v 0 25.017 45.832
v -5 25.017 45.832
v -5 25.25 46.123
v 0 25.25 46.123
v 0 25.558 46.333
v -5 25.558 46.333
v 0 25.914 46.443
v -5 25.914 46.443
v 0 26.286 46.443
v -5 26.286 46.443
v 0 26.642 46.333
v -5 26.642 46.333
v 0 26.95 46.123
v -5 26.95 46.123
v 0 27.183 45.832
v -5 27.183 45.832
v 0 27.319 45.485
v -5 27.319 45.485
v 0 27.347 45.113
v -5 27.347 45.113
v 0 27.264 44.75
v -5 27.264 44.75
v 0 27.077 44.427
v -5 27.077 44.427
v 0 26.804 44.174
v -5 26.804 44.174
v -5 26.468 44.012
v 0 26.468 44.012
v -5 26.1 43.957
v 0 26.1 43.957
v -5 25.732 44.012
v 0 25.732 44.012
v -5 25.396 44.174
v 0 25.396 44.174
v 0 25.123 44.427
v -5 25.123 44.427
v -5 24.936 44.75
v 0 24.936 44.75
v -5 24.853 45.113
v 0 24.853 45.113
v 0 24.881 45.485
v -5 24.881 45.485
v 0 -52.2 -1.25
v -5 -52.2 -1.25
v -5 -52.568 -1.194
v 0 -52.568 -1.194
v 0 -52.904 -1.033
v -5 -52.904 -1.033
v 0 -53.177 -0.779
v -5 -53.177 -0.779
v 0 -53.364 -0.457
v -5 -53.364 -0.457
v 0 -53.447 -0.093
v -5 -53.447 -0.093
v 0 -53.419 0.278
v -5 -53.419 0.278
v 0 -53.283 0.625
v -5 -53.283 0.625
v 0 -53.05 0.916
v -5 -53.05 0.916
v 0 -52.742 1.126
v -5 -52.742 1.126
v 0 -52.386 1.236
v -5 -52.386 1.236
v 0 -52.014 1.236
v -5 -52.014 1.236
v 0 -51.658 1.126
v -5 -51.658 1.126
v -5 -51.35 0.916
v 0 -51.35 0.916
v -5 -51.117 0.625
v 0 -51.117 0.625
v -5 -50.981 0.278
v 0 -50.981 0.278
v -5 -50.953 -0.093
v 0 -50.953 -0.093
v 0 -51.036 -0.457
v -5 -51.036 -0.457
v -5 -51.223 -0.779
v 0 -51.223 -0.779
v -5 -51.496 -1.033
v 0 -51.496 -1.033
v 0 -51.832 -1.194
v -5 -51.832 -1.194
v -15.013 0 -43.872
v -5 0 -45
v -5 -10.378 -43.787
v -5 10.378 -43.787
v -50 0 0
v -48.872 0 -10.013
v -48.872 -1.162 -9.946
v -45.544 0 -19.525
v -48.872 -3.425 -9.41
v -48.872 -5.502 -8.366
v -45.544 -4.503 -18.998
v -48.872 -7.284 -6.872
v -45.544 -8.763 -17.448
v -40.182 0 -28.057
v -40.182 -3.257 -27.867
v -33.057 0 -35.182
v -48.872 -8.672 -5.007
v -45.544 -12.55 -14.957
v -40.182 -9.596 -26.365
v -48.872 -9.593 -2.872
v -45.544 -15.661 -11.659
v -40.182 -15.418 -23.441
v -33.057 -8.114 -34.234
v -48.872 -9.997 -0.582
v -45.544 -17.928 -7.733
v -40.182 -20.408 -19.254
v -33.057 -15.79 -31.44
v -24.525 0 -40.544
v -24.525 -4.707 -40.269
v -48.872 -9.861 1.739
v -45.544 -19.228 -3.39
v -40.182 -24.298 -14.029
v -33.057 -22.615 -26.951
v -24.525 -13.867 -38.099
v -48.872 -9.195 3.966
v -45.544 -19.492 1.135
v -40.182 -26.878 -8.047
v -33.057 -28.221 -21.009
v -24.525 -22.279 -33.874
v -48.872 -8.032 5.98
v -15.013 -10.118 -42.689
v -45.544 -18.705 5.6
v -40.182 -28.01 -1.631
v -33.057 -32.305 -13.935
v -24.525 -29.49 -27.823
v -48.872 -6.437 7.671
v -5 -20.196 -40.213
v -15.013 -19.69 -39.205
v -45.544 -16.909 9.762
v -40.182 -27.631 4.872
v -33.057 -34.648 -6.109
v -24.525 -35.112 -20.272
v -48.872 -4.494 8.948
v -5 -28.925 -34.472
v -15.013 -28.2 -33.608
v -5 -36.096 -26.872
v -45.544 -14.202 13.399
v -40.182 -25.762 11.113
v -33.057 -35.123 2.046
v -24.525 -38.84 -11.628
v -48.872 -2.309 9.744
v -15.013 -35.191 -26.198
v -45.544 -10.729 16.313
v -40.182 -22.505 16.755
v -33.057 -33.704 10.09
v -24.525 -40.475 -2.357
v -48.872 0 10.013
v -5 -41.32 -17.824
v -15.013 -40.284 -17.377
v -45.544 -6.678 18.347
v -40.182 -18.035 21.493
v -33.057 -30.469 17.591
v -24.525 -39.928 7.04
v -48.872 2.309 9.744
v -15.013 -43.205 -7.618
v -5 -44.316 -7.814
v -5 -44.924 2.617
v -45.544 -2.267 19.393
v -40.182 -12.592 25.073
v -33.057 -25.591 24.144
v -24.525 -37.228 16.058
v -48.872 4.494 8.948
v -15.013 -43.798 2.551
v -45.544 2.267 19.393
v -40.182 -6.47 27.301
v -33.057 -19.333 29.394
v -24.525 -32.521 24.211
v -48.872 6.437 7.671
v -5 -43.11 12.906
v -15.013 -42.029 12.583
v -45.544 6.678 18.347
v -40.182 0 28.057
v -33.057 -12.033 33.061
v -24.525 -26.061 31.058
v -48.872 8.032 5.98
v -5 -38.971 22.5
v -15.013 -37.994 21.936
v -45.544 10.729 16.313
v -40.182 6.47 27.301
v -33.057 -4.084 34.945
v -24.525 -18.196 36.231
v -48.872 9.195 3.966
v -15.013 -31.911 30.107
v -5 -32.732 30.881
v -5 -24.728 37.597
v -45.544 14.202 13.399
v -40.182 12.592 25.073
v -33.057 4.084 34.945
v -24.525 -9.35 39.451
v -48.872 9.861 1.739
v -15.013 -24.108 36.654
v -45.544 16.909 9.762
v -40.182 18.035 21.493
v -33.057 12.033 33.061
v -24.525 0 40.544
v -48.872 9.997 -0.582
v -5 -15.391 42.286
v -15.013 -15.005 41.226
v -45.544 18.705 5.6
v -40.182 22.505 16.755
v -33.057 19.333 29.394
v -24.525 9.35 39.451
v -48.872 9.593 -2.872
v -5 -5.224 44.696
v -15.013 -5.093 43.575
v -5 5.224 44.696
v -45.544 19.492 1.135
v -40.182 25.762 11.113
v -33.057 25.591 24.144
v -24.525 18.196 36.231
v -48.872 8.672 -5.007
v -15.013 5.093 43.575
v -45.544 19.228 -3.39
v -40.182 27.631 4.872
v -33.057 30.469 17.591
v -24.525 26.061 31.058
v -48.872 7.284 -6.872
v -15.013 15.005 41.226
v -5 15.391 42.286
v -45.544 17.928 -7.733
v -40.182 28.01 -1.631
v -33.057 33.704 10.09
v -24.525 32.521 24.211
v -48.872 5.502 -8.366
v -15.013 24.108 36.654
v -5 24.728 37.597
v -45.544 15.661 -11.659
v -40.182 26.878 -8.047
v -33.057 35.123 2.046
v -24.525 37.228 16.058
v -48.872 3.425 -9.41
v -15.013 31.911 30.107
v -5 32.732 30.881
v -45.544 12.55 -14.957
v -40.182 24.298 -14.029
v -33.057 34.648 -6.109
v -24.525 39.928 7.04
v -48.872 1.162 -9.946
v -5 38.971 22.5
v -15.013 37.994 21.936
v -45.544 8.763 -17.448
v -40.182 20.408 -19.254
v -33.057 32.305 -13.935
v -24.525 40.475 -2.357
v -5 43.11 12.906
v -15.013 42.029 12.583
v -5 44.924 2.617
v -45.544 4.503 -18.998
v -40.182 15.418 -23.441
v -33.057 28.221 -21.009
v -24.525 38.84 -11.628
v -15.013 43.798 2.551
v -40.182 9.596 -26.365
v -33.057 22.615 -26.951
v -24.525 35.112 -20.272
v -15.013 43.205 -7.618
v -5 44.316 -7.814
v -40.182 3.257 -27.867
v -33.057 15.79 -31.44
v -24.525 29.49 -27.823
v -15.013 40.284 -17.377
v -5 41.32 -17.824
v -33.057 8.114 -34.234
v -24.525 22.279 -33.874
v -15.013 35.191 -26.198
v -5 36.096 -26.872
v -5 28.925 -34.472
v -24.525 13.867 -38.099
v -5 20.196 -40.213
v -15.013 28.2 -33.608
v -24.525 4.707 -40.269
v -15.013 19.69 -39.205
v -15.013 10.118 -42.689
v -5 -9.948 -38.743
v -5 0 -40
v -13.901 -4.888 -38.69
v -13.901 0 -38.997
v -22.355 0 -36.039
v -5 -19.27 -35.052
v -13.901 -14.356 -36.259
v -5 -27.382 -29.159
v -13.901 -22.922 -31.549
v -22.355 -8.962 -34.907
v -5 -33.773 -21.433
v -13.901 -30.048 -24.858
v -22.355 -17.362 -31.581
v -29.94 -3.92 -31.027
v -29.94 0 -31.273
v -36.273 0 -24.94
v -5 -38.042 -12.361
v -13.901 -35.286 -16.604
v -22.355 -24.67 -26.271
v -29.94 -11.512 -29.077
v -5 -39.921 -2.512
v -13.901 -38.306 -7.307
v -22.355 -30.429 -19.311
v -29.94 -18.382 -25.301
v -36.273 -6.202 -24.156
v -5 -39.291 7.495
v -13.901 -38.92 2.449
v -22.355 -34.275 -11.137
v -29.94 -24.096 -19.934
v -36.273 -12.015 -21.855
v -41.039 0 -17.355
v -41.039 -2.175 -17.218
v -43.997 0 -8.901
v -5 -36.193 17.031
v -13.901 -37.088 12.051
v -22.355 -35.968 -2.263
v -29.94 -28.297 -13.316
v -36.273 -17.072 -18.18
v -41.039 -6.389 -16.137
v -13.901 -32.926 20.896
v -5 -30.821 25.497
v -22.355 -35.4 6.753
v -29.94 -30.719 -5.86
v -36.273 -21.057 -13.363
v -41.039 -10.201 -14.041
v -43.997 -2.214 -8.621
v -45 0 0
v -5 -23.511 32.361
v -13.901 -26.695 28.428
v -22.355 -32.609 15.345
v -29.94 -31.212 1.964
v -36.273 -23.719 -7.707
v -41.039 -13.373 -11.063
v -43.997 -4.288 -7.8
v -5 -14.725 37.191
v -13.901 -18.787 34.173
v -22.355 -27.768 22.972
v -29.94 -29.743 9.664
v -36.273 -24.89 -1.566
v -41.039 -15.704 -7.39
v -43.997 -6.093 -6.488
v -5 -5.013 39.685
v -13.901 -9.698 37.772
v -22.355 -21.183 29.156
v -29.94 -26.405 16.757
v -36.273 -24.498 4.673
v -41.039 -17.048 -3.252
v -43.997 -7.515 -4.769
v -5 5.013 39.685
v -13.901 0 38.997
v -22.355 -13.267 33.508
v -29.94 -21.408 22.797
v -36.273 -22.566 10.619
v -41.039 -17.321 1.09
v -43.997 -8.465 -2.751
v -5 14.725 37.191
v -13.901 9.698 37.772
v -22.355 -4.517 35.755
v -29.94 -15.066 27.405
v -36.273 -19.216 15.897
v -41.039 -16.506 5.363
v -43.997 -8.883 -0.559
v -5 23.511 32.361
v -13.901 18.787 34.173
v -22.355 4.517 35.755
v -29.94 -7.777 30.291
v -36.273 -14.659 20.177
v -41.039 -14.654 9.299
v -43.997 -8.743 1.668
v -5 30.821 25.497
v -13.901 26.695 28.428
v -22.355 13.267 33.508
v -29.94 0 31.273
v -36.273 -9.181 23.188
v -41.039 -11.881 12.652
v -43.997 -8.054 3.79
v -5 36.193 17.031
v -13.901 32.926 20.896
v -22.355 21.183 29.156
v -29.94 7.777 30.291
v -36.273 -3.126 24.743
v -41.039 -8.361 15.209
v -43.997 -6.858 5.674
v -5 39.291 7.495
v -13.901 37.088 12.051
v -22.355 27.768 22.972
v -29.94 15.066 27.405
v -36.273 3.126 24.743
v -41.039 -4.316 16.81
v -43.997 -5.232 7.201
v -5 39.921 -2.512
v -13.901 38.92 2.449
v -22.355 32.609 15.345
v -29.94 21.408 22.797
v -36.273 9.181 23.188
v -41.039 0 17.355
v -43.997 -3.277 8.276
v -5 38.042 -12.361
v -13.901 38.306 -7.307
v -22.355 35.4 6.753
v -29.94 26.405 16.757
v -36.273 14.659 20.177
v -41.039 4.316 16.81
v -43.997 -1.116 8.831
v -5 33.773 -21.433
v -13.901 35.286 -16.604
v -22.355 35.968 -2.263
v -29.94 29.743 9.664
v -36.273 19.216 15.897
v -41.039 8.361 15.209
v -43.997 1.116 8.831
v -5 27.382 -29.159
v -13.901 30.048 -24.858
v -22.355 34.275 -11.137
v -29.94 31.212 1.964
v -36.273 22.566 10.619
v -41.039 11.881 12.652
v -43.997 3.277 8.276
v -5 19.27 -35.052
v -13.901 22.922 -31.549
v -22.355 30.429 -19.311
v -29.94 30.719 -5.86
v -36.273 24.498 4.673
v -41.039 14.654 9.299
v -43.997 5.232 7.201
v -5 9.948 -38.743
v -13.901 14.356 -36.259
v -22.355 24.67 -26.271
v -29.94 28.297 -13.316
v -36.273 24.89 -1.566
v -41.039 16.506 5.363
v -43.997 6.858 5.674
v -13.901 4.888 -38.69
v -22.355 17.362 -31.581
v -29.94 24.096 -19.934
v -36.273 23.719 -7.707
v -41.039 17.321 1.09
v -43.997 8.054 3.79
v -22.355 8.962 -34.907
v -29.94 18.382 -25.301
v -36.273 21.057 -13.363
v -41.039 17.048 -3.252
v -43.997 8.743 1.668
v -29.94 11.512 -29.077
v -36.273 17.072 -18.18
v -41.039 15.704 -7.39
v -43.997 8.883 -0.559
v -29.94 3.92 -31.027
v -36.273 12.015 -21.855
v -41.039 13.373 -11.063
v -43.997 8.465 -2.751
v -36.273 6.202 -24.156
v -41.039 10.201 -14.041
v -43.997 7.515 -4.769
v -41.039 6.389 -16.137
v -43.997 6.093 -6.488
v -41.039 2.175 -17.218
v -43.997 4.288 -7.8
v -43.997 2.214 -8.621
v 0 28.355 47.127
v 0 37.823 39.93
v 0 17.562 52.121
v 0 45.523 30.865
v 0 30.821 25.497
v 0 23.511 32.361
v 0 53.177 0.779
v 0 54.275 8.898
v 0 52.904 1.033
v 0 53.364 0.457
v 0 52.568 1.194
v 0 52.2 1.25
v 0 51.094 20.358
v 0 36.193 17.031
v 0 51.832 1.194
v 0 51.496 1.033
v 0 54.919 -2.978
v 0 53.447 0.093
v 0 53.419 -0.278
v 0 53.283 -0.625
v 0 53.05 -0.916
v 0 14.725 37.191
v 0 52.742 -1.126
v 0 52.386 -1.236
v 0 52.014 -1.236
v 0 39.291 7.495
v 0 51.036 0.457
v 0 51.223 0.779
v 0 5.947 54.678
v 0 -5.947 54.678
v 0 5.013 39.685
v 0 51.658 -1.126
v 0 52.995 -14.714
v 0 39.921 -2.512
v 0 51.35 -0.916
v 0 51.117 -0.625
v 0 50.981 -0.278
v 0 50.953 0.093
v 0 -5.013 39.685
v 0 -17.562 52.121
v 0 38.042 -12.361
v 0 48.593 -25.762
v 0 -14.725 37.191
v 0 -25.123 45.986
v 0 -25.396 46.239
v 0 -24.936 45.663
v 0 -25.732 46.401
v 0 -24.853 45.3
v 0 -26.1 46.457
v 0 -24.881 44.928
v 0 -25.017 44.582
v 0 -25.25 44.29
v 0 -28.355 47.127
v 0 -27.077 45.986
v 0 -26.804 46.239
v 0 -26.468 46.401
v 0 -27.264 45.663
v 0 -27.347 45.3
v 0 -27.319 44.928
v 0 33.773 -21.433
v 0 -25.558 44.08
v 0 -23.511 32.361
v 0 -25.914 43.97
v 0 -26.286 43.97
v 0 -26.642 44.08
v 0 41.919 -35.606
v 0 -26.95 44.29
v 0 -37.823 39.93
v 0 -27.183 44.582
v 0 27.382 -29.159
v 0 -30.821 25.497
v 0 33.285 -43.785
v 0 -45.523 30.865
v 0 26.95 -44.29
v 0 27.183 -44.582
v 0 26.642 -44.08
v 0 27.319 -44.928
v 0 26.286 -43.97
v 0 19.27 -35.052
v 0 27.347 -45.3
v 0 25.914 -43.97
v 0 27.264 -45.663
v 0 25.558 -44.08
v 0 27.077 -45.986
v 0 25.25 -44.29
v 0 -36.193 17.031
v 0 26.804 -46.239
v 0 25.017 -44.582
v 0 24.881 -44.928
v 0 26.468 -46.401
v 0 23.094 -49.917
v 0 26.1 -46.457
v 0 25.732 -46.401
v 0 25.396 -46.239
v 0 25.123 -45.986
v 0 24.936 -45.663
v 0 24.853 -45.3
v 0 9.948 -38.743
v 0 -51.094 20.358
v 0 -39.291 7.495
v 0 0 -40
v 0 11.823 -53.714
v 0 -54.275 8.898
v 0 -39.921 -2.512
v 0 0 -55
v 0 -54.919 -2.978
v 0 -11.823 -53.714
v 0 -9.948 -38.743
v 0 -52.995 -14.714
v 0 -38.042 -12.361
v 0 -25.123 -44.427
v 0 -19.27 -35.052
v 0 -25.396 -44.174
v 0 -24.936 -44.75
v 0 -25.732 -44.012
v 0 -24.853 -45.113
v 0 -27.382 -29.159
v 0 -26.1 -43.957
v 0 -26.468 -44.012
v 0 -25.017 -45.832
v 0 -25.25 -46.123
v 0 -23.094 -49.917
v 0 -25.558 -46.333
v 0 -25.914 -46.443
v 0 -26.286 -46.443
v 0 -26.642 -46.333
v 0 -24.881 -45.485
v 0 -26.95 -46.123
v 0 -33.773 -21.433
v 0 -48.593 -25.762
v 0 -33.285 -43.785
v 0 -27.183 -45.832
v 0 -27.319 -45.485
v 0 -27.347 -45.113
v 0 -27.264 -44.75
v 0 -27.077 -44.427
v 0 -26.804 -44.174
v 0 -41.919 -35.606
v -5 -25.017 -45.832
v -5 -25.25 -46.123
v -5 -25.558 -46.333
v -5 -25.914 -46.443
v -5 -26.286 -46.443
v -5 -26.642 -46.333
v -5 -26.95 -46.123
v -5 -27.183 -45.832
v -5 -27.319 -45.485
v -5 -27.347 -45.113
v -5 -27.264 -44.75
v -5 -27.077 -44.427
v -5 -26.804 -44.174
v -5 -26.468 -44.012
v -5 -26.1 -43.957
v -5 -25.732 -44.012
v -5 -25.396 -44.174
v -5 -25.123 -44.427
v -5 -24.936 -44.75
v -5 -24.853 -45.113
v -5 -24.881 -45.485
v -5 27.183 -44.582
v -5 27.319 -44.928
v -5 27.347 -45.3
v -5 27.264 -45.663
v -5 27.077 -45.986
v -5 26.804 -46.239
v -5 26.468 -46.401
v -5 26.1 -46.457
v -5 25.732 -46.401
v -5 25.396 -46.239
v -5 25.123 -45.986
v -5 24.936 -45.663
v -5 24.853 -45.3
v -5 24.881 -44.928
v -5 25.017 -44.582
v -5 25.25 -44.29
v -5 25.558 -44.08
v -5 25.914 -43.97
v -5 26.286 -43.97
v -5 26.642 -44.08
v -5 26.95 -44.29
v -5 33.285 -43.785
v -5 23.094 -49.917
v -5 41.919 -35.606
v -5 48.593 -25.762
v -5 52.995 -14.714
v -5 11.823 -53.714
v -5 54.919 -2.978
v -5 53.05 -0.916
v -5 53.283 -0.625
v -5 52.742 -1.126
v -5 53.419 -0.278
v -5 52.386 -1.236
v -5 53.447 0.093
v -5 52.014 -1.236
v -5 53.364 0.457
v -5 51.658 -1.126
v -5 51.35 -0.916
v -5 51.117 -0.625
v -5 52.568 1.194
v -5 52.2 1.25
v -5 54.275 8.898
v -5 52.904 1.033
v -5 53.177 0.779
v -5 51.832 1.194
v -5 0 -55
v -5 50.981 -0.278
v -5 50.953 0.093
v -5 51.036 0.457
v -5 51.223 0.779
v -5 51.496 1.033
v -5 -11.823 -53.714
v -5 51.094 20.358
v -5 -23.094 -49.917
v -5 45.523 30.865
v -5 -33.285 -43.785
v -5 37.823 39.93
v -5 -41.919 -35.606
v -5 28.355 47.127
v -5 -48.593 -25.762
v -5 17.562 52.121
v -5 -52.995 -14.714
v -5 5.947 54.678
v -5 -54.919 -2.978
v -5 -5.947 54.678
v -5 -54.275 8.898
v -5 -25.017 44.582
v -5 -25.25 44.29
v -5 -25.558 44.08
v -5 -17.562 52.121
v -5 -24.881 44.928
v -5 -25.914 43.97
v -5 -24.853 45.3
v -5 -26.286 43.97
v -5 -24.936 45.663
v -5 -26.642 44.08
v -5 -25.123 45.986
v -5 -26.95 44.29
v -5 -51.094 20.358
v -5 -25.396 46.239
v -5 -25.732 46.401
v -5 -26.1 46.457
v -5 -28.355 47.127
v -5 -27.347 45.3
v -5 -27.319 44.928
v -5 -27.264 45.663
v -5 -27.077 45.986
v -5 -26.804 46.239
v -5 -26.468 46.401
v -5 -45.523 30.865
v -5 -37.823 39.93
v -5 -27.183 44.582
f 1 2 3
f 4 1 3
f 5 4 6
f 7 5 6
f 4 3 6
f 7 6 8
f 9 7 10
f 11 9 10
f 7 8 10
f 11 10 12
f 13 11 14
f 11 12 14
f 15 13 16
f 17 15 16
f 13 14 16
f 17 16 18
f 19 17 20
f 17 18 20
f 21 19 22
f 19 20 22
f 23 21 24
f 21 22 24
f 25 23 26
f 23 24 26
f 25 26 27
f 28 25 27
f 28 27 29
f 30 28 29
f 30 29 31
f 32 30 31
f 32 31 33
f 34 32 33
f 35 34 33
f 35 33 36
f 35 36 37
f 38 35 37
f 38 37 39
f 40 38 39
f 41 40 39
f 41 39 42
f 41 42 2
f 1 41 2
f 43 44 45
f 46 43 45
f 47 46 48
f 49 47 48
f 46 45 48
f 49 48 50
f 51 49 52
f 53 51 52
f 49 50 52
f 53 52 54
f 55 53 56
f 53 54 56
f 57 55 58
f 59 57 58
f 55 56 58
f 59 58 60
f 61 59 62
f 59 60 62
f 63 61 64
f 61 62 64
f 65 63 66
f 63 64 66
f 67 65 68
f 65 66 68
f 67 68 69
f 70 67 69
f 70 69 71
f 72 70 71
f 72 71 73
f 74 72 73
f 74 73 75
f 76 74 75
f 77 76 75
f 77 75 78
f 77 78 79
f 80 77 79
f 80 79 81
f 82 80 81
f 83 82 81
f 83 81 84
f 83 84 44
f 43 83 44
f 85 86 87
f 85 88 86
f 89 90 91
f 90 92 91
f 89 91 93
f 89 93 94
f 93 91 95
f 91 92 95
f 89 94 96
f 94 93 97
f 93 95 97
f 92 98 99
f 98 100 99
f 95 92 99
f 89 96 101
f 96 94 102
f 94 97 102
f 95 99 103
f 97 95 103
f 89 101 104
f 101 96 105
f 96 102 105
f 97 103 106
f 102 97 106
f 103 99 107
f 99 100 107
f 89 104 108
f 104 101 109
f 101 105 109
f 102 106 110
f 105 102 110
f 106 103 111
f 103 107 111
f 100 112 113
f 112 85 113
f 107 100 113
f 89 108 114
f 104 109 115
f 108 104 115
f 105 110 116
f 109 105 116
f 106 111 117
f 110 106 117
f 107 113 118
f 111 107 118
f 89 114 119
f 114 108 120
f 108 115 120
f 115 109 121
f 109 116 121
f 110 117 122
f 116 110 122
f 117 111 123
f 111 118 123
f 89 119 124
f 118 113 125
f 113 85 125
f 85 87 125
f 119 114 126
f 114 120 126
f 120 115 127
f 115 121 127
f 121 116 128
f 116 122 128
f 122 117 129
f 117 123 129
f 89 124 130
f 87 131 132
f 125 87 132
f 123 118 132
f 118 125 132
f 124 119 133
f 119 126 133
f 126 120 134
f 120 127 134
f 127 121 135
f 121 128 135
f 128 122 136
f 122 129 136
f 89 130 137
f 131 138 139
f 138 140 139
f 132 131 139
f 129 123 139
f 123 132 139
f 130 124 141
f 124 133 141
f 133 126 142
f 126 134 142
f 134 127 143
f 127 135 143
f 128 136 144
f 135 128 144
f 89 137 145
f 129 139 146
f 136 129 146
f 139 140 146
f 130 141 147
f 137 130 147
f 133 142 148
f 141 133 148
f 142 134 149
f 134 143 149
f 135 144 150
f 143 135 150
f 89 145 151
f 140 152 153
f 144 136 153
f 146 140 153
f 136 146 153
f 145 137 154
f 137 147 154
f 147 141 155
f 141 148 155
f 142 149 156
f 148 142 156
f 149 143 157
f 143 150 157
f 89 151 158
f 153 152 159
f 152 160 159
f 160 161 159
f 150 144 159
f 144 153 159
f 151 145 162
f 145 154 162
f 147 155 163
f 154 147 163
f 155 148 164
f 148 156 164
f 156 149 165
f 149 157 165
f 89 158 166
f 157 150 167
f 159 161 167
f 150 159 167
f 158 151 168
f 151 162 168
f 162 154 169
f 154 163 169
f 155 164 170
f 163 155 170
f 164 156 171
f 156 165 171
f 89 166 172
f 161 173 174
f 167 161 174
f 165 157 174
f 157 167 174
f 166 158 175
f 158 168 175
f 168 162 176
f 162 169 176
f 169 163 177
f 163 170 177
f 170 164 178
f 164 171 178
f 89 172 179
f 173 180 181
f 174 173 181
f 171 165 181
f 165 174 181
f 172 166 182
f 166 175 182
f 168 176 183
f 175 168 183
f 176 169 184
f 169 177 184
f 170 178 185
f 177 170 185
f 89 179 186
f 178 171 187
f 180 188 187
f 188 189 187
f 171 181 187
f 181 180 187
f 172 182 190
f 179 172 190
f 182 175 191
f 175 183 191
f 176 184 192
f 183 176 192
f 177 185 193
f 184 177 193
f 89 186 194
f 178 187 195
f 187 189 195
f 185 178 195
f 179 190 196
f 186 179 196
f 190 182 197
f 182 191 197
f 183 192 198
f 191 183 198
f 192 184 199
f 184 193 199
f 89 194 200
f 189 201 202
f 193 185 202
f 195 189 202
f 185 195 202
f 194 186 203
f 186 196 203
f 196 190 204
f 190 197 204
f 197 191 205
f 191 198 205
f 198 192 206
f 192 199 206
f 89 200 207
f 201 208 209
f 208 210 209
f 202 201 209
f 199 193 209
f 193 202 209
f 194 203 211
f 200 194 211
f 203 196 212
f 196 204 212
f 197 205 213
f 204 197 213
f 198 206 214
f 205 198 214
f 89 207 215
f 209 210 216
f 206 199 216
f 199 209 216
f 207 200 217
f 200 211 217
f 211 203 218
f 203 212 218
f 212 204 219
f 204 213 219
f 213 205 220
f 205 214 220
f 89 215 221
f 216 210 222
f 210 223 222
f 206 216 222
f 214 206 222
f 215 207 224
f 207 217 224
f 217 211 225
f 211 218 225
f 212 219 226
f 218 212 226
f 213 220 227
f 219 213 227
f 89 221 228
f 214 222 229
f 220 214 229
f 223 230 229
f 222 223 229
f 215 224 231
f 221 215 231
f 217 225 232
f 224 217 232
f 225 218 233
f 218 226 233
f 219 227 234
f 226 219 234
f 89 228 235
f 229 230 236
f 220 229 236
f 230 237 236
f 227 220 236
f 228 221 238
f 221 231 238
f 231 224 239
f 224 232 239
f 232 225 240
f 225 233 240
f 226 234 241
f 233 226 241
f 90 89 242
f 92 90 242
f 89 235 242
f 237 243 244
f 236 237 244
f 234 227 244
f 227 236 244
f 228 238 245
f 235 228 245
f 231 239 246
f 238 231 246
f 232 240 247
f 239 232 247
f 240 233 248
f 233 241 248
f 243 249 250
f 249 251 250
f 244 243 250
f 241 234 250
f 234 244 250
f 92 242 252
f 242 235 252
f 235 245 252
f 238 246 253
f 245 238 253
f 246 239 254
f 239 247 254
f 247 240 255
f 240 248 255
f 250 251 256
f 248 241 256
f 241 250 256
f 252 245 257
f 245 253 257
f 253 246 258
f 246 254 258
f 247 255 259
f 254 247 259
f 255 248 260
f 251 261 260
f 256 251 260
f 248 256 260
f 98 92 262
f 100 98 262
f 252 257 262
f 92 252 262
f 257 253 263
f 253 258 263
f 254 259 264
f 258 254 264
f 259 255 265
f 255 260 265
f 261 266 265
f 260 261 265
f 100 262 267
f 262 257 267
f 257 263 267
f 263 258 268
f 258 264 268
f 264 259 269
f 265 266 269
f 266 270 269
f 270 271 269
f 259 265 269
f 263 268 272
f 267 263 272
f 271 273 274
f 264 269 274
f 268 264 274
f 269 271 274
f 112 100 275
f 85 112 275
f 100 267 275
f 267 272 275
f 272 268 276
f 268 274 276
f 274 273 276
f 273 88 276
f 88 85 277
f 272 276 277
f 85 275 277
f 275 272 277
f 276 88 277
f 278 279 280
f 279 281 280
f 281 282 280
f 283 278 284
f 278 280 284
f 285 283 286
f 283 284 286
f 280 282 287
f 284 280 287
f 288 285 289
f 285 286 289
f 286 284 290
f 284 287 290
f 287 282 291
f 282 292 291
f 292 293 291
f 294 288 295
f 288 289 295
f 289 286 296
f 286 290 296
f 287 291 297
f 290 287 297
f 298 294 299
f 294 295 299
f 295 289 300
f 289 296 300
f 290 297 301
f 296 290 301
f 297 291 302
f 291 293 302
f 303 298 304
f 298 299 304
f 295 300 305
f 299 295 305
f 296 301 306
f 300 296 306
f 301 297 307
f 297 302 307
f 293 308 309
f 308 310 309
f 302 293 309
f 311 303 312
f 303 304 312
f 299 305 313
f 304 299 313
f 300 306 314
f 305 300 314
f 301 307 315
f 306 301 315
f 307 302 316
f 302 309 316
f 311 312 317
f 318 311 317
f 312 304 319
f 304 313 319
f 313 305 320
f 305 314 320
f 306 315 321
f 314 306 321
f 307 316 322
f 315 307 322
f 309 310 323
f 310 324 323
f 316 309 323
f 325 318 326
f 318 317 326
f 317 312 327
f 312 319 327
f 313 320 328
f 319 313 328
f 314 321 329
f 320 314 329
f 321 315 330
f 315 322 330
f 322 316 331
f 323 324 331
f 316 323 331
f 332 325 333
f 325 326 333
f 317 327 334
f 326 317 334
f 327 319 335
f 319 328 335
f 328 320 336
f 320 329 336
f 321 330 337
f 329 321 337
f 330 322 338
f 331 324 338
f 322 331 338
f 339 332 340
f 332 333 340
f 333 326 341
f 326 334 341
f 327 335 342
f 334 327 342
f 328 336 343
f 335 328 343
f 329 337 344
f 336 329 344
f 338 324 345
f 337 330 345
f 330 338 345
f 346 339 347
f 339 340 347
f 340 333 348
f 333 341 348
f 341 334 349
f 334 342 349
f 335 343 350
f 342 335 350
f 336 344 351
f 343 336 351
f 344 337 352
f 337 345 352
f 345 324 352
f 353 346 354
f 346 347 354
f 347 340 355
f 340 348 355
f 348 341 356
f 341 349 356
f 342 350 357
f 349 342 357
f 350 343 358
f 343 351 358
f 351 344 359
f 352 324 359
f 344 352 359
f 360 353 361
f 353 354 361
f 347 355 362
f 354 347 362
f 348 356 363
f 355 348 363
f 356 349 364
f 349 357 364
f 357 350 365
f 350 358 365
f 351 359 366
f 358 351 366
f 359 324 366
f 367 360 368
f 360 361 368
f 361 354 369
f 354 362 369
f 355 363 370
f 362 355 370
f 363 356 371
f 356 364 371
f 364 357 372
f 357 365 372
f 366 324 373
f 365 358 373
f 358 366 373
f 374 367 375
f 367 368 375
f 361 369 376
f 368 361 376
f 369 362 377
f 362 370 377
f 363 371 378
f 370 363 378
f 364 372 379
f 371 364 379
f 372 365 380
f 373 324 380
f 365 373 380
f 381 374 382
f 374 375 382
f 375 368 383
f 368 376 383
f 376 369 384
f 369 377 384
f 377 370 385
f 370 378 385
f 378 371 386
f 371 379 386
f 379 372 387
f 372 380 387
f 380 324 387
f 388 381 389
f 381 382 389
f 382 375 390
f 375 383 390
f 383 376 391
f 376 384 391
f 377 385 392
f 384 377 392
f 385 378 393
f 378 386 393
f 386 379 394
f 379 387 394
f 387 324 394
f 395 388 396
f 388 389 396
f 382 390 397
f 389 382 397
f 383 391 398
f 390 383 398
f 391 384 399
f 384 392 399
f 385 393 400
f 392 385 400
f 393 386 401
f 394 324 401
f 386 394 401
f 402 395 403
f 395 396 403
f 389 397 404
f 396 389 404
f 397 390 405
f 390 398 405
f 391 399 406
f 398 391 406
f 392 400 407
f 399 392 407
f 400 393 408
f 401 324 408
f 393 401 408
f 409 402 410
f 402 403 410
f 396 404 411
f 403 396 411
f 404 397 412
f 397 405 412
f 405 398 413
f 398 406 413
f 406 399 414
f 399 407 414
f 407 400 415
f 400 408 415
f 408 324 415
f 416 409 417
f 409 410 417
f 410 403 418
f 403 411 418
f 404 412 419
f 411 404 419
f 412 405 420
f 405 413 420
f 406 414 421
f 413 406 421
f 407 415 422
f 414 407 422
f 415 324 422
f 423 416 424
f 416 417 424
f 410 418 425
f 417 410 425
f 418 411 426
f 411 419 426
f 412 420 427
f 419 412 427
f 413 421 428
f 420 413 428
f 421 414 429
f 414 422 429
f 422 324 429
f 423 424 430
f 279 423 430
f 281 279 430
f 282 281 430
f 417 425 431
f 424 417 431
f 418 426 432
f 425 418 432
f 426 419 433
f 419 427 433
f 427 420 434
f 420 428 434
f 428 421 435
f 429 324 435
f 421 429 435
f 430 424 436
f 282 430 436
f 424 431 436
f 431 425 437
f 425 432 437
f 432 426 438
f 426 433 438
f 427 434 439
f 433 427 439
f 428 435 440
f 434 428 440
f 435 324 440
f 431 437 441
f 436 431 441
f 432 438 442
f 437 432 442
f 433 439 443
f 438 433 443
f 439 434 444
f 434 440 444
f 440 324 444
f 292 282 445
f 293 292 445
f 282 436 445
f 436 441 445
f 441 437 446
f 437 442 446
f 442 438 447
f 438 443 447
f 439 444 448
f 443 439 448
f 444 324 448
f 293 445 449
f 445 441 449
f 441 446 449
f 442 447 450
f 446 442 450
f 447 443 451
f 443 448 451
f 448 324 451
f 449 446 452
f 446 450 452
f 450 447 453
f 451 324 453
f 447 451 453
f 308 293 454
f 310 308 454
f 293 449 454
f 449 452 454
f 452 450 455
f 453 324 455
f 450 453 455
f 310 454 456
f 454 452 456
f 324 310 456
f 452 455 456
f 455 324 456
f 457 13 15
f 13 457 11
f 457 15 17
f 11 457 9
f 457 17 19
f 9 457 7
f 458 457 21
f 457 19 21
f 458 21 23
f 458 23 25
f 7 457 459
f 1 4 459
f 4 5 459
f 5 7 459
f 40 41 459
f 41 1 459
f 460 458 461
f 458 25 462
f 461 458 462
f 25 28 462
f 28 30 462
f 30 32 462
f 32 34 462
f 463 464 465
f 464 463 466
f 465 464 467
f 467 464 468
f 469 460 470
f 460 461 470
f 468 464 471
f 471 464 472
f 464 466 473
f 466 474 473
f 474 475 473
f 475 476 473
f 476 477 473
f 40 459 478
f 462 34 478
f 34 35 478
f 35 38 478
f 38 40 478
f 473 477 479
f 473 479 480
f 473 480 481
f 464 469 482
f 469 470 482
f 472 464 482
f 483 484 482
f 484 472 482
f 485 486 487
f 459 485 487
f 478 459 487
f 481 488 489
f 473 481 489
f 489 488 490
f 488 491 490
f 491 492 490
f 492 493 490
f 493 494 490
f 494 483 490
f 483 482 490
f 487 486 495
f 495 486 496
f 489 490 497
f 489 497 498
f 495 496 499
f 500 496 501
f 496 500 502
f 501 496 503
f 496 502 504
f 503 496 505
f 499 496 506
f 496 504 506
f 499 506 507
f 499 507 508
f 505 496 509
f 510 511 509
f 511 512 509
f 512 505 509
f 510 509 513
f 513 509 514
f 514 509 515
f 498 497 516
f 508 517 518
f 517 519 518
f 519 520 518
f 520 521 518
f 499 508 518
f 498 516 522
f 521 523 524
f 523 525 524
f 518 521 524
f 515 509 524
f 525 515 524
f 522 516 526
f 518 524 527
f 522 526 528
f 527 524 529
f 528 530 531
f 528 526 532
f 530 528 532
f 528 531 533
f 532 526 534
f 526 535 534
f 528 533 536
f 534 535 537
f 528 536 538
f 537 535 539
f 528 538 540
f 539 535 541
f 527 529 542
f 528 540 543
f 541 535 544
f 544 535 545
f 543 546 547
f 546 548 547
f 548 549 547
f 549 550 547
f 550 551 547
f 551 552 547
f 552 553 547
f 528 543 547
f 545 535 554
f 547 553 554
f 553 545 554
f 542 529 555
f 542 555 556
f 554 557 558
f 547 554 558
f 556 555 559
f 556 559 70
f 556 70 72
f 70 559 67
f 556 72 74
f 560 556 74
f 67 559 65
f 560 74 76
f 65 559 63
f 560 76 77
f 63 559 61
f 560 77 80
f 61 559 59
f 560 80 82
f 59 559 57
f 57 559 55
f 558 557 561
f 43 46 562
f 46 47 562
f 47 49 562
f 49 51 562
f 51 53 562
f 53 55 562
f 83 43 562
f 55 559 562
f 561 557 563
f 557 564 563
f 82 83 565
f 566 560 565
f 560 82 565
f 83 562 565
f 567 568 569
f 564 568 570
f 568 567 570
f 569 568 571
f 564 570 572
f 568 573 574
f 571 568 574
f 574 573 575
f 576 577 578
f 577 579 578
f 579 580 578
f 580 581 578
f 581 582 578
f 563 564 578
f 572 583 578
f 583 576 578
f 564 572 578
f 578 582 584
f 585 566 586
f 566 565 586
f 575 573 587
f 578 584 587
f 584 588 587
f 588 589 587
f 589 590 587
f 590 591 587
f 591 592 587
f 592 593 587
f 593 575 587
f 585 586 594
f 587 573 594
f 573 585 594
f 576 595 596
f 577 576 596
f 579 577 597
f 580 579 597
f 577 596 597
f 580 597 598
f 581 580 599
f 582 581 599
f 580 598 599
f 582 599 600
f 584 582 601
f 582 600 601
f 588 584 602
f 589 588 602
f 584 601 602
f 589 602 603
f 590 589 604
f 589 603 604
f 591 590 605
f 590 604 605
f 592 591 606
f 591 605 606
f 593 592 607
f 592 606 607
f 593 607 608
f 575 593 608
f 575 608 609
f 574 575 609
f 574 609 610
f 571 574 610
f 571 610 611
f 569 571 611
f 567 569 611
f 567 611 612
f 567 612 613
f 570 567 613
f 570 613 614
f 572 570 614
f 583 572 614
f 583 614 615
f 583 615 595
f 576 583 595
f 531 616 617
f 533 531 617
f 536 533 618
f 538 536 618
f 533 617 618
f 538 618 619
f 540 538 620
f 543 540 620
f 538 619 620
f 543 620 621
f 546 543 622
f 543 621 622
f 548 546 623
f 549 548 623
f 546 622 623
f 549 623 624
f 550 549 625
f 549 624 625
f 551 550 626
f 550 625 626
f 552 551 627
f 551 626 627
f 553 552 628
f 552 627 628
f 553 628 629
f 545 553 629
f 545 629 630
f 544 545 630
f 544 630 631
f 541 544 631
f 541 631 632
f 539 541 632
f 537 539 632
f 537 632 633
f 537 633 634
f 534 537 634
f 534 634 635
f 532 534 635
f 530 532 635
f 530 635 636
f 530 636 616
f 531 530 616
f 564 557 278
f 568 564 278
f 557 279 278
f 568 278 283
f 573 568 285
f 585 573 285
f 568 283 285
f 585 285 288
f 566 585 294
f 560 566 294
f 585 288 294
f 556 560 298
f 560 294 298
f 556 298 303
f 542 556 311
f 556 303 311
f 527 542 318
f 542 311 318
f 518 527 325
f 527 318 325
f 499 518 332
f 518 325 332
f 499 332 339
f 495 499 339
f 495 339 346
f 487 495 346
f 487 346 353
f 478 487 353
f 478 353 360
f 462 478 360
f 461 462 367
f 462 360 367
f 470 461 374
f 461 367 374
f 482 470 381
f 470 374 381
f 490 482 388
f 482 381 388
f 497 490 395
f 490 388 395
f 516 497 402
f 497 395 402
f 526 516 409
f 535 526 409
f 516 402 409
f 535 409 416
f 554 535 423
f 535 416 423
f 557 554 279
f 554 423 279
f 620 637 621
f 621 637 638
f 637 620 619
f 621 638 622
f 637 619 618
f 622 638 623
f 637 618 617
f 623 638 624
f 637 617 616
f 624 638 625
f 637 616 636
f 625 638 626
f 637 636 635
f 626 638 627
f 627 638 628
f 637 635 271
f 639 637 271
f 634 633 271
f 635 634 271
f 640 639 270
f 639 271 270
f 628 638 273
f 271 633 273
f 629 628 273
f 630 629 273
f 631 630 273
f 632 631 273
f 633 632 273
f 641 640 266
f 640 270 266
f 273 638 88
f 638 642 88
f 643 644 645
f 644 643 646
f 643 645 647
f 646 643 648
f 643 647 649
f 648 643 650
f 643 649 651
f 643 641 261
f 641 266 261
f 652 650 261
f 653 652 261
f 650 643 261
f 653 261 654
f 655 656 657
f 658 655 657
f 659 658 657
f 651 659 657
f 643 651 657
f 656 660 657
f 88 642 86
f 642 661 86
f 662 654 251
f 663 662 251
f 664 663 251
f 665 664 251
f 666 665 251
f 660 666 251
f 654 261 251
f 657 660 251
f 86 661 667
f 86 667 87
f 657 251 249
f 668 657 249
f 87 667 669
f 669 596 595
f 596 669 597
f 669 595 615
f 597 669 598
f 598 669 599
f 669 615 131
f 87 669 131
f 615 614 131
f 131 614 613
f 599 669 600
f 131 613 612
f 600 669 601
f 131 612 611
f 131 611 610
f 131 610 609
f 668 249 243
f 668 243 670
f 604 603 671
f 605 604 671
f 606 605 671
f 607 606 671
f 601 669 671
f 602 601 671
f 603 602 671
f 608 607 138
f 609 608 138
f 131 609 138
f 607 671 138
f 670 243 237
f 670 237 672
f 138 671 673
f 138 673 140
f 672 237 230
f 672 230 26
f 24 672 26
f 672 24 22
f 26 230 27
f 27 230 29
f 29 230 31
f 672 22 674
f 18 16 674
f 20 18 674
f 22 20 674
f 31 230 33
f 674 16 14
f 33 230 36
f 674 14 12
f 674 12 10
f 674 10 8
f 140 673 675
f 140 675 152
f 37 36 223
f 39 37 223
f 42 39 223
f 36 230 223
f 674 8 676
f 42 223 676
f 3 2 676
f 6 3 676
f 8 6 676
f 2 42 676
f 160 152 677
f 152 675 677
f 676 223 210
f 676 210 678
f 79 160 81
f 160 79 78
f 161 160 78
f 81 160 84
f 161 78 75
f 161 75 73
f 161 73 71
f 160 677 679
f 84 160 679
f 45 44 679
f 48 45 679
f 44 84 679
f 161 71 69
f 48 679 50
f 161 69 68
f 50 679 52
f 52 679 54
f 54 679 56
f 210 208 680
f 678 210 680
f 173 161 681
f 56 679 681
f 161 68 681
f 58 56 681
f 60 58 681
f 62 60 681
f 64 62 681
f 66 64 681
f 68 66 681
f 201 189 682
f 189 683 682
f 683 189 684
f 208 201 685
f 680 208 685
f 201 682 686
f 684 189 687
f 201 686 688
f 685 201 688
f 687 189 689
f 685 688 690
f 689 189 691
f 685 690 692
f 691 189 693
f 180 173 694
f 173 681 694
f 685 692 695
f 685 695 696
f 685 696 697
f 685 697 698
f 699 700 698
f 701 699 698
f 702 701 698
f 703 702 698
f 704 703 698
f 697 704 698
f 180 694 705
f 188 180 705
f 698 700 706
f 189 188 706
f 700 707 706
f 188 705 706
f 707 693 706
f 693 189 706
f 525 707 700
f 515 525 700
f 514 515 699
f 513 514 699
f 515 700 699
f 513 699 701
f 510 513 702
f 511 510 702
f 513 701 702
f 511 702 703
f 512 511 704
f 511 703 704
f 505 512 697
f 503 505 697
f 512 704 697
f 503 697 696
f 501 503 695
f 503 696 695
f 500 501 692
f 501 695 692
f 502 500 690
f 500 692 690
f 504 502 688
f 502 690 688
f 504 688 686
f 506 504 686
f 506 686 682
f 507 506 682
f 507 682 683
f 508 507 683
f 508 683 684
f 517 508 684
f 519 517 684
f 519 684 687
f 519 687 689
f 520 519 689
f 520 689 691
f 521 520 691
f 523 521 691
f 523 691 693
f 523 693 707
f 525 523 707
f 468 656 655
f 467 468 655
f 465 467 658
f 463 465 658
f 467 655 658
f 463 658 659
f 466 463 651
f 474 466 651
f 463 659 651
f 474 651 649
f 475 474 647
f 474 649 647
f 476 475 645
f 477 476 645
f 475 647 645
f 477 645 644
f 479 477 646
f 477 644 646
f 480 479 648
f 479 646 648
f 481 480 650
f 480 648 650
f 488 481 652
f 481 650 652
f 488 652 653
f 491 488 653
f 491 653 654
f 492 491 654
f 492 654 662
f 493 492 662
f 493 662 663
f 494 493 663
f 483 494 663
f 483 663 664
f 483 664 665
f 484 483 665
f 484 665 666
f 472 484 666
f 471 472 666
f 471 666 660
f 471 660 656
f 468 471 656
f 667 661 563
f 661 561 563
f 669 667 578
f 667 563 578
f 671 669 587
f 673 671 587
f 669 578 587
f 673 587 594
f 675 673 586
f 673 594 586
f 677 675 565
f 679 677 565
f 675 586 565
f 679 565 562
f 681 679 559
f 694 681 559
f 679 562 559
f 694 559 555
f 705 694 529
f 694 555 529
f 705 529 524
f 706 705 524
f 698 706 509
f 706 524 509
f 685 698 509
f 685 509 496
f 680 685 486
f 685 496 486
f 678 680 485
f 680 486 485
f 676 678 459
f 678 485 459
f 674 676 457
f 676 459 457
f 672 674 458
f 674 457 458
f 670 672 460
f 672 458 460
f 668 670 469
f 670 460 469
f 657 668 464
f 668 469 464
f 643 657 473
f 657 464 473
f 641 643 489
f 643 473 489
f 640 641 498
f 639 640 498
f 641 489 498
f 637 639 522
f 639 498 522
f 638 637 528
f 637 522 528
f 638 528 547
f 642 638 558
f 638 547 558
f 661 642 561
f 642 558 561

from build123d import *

# Parameters (mm, degrees)
SKETCH_4_R               = 1.25
CUT_EXTRUDE_1_DEPTH      = 6
PATTERN_CIRCULAR_1_COUNT = 6


with BuildPart() as part:
    # 草图2 → 旋转1 (revolve)
    with BuildSketch(Plane(origin=(0, 0, 0), x_dir=(1, 0, 0), z_dir=(0, 1, 0))):
        with BuildLine():
            Line((-45, 0), (-50, 0))
            ThreePointArc((-50, 0), (-36.819805153, 31.819805153), (-5, 45))
            Line((-5, 45), (-5, 55))
            Line((-5, 55), (0, 55))
            Line((0, 55), (0, 40))
            Line((0, 40), (-5, 40))
            ThreePointArc((-5, 40), (-33.284271247, 28.284271247), (-45, 0))
        make_face()
    revolve(axis=Axis((95.822015525, 0, 0), (-1, 0, 0)))

    # 草图4 → 切除-拉伸1 (cut, through all)
    with BuildSketch(Plane.ZY.offset(5)):
        with Locations((0, 52.2)):
            Circle(SKETCH_4_R)
    cut_extrude_1 = extrude(amount=-CUT_EXTRUDE_1_DEPTH, mode=Mode.SUBTRACT)

    # 阵列(圆周)1: 切除-拉伸1 ×6 about axis
    pattern_circular_1_axis = Axis((0, 0, 0), (1, 0, 0))
    for i in range(1, PATTERN_CIRCULAR_1_COUNT):
        add(cut_extrude_1.rotate(pattern_circular_1_axis, i * 360 / PATTERN_CIRCULAR_1_COUNT), mode=Mode.SUBTRACT)


solid = part.part
